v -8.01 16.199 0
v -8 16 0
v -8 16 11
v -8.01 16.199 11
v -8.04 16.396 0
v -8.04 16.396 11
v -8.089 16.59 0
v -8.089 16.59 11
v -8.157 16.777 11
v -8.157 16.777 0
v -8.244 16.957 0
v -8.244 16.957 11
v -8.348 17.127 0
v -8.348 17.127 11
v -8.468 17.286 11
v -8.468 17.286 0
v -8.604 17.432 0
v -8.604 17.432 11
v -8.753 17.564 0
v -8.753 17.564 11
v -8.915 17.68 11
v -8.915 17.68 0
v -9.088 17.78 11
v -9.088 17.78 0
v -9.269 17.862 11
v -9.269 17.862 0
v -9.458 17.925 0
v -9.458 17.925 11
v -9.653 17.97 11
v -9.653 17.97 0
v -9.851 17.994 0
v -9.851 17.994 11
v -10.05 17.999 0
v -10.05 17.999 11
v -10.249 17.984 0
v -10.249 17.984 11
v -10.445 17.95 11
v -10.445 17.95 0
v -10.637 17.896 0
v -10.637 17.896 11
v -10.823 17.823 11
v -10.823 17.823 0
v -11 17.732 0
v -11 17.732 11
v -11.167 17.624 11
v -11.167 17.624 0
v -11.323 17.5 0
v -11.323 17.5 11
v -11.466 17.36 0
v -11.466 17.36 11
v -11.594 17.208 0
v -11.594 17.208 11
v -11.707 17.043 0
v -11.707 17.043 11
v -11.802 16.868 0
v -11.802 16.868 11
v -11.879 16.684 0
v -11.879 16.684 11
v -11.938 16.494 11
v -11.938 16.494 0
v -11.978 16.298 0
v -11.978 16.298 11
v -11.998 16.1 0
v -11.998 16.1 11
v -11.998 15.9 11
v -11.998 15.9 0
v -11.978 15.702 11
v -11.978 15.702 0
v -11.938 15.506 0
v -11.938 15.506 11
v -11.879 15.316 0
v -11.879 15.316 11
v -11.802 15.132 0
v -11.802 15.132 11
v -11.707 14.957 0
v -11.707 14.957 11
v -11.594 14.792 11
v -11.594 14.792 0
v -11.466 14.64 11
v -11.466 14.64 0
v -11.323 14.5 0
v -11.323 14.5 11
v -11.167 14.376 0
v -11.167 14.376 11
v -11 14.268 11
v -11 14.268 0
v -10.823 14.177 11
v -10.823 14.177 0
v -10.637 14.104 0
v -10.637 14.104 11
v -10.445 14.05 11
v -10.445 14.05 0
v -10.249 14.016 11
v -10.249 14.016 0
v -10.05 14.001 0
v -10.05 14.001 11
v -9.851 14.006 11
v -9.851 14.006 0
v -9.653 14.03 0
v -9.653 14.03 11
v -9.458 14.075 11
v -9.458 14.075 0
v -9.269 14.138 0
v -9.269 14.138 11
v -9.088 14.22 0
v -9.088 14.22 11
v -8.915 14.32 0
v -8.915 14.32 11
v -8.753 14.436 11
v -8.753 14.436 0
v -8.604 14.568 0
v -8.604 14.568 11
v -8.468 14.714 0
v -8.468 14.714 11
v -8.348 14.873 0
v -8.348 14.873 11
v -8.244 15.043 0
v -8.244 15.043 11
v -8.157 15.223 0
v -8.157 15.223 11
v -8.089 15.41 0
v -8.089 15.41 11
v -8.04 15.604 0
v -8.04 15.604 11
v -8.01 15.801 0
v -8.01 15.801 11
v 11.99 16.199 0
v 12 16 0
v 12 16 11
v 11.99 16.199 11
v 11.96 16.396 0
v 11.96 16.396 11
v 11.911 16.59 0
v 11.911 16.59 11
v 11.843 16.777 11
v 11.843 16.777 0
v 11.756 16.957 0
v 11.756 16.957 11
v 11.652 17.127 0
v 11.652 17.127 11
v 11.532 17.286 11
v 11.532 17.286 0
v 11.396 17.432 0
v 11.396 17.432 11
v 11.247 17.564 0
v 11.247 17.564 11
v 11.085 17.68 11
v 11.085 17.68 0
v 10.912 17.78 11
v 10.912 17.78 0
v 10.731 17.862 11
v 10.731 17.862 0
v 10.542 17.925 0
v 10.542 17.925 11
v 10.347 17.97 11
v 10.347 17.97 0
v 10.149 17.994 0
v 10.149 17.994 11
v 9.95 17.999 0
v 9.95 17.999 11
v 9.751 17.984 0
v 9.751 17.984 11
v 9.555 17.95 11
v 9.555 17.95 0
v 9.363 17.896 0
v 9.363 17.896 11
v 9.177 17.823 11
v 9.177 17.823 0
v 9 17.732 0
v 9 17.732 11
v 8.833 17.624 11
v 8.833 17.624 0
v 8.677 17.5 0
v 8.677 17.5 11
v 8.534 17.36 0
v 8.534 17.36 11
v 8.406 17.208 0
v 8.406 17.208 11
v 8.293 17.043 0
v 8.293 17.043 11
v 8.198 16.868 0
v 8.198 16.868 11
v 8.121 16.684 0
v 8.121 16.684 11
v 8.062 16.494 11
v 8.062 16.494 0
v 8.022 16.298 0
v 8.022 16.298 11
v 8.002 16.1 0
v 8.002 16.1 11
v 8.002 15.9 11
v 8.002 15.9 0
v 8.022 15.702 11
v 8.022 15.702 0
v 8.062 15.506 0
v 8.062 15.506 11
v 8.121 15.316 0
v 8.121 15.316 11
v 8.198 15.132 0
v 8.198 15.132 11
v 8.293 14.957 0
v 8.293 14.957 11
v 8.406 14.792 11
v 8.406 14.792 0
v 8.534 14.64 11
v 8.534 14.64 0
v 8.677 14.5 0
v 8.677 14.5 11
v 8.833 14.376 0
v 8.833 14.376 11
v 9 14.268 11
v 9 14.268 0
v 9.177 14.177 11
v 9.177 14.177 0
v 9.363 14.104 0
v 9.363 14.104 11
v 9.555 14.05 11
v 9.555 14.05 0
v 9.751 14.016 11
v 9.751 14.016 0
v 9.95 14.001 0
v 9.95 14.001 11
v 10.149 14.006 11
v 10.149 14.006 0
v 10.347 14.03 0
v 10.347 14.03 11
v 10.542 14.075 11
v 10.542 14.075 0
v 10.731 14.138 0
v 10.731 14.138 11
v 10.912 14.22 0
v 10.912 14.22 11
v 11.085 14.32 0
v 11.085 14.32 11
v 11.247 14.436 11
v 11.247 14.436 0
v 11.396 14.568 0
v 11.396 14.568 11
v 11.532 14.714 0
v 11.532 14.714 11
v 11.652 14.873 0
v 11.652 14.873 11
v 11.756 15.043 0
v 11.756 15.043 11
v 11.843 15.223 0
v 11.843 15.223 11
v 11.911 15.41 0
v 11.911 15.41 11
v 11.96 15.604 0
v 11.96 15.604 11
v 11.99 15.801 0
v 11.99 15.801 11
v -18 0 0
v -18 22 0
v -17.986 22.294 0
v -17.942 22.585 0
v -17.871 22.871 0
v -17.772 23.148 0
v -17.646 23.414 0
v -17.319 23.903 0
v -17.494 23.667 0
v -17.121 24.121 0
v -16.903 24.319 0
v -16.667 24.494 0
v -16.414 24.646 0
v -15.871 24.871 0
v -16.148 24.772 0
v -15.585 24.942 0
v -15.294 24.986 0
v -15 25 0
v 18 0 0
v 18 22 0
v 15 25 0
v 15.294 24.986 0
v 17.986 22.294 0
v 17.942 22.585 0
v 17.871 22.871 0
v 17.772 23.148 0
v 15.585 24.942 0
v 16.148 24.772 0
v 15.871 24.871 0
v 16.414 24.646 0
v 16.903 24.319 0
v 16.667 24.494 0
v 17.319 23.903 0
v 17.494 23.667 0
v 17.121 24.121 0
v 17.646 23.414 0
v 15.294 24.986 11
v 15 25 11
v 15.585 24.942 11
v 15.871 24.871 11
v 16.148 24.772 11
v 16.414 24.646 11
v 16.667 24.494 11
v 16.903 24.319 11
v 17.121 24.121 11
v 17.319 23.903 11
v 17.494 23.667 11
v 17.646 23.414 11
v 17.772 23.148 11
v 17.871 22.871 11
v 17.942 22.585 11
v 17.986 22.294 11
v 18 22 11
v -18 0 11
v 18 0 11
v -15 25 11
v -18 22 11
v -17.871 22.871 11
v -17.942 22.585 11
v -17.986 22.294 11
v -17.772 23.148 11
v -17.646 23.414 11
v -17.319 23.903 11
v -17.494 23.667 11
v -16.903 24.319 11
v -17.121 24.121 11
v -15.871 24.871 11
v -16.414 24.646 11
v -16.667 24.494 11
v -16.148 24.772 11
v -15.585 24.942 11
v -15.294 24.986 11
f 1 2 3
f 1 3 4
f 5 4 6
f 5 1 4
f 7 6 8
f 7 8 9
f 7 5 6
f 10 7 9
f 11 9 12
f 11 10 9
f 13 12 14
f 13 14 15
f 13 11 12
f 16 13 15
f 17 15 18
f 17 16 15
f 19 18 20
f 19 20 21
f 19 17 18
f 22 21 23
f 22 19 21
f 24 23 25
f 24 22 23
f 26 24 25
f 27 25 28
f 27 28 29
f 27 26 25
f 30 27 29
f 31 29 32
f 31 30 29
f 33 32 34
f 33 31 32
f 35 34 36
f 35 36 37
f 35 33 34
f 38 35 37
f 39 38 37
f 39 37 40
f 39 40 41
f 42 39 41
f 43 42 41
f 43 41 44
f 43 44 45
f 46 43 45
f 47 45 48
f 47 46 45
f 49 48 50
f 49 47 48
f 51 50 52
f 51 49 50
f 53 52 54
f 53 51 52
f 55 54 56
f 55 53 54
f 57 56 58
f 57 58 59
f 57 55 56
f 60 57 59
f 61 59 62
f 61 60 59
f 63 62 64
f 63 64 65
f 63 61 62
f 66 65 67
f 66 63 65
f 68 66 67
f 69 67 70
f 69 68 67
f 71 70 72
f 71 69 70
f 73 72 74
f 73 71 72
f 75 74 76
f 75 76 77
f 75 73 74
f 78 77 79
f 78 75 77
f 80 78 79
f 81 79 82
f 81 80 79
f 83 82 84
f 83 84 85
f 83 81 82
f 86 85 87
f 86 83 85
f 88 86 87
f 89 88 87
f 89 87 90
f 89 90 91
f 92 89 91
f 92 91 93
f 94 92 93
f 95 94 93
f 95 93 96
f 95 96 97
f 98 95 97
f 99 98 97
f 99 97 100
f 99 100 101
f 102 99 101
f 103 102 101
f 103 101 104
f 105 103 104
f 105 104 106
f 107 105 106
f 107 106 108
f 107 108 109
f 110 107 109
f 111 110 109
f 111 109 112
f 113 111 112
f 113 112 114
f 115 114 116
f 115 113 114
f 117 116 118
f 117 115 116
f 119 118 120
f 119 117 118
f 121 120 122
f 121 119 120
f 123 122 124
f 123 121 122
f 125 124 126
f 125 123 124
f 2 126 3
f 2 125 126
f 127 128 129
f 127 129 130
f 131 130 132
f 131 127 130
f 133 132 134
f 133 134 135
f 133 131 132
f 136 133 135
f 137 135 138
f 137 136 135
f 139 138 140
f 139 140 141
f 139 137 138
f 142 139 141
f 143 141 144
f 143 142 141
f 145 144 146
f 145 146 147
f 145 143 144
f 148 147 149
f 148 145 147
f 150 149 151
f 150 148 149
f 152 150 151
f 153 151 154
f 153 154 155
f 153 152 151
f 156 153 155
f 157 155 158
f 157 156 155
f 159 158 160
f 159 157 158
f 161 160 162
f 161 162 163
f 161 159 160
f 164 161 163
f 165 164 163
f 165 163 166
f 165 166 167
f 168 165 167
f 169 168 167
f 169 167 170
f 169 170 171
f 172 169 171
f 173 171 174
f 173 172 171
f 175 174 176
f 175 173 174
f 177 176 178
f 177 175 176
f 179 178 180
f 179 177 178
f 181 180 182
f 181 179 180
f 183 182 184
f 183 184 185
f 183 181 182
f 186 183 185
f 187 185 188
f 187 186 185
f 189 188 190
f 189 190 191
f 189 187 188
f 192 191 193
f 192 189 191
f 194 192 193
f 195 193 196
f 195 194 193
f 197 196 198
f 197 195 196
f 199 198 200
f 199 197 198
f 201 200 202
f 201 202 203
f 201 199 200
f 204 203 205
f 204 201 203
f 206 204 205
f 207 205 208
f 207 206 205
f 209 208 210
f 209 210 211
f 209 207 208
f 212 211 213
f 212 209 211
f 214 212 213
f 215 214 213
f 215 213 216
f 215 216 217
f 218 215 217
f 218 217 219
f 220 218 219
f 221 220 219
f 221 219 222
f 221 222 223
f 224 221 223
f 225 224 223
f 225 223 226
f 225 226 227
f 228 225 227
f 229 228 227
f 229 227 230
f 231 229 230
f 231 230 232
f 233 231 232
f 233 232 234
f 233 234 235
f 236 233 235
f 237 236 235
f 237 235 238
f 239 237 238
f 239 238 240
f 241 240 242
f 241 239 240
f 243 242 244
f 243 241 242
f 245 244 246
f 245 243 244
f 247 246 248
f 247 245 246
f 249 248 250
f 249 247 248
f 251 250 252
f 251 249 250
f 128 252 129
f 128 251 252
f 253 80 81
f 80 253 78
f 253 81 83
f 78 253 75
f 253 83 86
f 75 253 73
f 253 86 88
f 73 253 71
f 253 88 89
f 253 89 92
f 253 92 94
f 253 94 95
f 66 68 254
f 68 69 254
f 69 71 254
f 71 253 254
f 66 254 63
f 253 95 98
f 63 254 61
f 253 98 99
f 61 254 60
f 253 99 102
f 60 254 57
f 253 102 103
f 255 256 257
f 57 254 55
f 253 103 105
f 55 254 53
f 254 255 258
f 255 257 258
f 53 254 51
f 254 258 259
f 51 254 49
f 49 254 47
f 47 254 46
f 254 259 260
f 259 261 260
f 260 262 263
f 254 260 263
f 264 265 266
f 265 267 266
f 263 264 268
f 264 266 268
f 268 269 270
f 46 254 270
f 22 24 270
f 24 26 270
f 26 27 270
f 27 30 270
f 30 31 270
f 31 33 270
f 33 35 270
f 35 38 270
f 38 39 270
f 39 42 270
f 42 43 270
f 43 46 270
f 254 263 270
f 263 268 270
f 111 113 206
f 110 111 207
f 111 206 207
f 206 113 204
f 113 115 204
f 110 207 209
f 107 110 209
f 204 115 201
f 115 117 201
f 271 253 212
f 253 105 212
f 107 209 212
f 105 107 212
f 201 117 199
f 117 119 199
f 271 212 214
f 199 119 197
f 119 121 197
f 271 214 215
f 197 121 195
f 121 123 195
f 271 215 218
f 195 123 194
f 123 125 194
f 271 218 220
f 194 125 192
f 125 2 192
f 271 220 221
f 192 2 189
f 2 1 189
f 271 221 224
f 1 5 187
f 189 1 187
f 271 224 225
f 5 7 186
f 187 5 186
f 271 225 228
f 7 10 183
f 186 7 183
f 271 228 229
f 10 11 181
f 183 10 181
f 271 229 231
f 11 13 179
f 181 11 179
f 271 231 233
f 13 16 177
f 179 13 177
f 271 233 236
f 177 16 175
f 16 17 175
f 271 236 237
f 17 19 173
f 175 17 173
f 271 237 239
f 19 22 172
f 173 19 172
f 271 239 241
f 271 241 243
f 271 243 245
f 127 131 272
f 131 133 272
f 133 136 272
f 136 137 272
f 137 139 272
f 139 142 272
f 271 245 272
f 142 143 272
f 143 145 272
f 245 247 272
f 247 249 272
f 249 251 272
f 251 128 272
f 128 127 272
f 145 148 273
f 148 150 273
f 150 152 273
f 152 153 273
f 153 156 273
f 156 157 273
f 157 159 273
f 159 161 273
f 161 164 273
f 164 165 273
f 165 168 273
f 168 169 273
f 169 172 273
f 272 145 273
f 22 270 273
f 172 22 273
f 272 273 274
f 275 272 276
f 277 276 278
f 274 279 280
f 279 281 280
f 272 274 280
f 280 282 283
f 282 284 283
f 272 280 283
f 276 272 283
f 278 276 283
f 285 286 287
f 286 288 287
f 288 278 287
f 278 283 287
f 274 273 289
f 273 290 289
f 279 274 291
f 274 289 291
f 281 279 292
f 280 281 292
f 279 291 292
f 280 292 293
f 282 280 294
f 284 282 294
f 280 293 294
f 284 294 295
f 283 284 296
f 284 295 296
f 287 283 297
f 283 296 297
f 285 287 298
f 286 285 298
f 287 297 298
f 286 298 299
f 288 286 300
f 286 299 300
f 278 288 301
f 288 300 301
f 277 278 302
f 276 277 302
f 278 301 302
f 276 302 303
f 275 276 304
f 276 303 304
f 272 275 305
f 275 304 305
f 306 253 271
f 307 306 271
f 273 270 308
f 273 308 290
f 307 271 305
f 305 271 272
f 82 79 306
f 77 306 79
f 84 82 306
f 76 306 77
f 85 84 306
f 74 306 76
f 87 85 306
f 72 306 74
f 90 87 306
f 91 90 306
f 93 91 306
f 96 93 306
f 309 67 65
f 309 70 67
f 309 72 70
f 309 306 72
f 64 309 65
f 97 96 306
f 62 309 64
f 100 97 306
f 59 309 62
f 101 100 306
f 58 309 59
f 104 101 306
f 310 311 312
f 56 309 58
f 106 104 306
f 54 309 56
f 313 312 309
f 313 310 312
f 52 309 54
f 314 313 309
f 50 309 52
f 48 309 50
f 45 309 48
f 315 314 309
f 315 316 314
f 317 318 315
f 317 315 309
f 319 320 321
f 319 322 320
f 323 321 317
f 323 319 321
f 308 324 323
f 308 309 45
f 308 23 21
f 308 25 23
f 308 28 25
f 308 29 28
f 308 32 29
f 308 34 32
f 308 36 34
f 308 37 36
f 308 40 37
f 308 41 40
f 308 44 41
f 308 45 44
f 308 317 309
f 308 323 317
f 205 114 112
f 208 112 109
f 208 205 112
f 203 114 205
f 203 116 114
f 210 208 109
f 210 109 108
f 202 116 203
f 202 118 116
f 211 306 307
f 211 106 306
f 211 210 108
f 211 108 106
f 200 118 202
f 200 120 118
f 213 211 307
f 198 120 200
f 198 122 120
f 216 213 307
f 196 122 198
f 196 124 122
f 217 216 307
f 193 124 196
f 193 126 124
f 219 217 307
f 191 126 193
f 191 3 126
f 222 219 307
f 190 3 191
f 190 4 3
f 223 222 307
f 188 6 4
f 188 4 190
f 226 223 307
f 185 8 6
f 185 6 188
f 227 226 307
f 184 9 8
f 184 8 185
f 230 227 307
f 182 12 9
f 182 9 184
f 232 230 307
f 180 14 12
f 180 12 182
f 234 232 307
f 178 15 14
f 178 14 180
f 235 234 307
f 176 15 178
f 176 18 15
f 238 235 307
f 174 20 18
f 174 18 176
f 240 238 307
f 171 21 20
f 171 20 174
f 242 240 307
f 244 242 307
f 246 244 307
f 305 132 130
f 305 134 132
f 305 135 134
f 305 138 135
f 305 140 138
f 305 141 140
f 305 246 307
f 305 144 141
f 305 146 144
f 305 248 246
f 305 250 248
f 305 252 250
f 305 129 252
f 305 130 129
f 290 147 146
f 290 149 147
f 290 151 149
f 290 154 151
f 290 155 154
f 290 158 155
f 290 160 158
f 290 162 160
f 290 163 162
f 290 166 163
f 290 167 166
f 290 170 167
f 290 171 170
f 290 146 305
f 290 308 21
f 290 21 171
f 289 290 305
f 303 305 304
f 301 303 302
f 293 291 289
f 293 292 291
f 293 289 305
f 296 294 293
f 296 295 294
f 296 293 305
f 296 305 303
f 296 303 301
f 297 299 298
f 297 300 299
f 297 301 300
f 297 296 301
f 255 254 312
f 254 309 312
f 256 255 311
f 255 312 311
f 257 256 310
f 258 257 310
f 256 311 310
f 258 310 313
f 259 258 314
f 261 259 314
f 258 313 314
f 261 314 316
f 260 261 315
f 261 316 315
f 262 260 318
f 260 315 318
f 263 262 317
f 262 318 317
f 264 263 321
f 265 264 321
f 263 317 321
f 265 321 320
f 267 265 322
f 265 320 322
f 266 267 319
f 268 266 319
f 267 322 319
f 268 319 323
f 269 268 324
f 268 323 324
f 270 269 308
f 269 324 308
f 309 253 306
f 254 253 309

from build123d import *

# Parameters (mm, degrees)
SKETCH_W  = 36
SKETCH_H  = 25
SKETCH_R  = 2
PAD_DEPTH = 11
FILLET_R  = 3


with BuildPart() as part:
    # Sketch → Pad (new body)
    with BuildSketch(Plane.XY):
        with Locations((0, 12.5)):
            Rectangle(SKETCH_W, SKETCH_H)
        with Locations((10, 16)):
            Circle(SKETCH_R, mode=Mode.SUBTRACT)
        with Locations((-10, 16)):
            Circle(SKETCH_R, mode=Mode.SUBTRACT)
    extrude(amount=PAD_DEPTH)

    # Fillet
    fillet_edges = [part.edges().sort_by_distance(p)[0] for p in [
        (-18, 25, 5.5),
        (18, 25, 5.5),
    ]]
    fillet(fillet_edges, radius=FILLET_R)


solid = part.part
